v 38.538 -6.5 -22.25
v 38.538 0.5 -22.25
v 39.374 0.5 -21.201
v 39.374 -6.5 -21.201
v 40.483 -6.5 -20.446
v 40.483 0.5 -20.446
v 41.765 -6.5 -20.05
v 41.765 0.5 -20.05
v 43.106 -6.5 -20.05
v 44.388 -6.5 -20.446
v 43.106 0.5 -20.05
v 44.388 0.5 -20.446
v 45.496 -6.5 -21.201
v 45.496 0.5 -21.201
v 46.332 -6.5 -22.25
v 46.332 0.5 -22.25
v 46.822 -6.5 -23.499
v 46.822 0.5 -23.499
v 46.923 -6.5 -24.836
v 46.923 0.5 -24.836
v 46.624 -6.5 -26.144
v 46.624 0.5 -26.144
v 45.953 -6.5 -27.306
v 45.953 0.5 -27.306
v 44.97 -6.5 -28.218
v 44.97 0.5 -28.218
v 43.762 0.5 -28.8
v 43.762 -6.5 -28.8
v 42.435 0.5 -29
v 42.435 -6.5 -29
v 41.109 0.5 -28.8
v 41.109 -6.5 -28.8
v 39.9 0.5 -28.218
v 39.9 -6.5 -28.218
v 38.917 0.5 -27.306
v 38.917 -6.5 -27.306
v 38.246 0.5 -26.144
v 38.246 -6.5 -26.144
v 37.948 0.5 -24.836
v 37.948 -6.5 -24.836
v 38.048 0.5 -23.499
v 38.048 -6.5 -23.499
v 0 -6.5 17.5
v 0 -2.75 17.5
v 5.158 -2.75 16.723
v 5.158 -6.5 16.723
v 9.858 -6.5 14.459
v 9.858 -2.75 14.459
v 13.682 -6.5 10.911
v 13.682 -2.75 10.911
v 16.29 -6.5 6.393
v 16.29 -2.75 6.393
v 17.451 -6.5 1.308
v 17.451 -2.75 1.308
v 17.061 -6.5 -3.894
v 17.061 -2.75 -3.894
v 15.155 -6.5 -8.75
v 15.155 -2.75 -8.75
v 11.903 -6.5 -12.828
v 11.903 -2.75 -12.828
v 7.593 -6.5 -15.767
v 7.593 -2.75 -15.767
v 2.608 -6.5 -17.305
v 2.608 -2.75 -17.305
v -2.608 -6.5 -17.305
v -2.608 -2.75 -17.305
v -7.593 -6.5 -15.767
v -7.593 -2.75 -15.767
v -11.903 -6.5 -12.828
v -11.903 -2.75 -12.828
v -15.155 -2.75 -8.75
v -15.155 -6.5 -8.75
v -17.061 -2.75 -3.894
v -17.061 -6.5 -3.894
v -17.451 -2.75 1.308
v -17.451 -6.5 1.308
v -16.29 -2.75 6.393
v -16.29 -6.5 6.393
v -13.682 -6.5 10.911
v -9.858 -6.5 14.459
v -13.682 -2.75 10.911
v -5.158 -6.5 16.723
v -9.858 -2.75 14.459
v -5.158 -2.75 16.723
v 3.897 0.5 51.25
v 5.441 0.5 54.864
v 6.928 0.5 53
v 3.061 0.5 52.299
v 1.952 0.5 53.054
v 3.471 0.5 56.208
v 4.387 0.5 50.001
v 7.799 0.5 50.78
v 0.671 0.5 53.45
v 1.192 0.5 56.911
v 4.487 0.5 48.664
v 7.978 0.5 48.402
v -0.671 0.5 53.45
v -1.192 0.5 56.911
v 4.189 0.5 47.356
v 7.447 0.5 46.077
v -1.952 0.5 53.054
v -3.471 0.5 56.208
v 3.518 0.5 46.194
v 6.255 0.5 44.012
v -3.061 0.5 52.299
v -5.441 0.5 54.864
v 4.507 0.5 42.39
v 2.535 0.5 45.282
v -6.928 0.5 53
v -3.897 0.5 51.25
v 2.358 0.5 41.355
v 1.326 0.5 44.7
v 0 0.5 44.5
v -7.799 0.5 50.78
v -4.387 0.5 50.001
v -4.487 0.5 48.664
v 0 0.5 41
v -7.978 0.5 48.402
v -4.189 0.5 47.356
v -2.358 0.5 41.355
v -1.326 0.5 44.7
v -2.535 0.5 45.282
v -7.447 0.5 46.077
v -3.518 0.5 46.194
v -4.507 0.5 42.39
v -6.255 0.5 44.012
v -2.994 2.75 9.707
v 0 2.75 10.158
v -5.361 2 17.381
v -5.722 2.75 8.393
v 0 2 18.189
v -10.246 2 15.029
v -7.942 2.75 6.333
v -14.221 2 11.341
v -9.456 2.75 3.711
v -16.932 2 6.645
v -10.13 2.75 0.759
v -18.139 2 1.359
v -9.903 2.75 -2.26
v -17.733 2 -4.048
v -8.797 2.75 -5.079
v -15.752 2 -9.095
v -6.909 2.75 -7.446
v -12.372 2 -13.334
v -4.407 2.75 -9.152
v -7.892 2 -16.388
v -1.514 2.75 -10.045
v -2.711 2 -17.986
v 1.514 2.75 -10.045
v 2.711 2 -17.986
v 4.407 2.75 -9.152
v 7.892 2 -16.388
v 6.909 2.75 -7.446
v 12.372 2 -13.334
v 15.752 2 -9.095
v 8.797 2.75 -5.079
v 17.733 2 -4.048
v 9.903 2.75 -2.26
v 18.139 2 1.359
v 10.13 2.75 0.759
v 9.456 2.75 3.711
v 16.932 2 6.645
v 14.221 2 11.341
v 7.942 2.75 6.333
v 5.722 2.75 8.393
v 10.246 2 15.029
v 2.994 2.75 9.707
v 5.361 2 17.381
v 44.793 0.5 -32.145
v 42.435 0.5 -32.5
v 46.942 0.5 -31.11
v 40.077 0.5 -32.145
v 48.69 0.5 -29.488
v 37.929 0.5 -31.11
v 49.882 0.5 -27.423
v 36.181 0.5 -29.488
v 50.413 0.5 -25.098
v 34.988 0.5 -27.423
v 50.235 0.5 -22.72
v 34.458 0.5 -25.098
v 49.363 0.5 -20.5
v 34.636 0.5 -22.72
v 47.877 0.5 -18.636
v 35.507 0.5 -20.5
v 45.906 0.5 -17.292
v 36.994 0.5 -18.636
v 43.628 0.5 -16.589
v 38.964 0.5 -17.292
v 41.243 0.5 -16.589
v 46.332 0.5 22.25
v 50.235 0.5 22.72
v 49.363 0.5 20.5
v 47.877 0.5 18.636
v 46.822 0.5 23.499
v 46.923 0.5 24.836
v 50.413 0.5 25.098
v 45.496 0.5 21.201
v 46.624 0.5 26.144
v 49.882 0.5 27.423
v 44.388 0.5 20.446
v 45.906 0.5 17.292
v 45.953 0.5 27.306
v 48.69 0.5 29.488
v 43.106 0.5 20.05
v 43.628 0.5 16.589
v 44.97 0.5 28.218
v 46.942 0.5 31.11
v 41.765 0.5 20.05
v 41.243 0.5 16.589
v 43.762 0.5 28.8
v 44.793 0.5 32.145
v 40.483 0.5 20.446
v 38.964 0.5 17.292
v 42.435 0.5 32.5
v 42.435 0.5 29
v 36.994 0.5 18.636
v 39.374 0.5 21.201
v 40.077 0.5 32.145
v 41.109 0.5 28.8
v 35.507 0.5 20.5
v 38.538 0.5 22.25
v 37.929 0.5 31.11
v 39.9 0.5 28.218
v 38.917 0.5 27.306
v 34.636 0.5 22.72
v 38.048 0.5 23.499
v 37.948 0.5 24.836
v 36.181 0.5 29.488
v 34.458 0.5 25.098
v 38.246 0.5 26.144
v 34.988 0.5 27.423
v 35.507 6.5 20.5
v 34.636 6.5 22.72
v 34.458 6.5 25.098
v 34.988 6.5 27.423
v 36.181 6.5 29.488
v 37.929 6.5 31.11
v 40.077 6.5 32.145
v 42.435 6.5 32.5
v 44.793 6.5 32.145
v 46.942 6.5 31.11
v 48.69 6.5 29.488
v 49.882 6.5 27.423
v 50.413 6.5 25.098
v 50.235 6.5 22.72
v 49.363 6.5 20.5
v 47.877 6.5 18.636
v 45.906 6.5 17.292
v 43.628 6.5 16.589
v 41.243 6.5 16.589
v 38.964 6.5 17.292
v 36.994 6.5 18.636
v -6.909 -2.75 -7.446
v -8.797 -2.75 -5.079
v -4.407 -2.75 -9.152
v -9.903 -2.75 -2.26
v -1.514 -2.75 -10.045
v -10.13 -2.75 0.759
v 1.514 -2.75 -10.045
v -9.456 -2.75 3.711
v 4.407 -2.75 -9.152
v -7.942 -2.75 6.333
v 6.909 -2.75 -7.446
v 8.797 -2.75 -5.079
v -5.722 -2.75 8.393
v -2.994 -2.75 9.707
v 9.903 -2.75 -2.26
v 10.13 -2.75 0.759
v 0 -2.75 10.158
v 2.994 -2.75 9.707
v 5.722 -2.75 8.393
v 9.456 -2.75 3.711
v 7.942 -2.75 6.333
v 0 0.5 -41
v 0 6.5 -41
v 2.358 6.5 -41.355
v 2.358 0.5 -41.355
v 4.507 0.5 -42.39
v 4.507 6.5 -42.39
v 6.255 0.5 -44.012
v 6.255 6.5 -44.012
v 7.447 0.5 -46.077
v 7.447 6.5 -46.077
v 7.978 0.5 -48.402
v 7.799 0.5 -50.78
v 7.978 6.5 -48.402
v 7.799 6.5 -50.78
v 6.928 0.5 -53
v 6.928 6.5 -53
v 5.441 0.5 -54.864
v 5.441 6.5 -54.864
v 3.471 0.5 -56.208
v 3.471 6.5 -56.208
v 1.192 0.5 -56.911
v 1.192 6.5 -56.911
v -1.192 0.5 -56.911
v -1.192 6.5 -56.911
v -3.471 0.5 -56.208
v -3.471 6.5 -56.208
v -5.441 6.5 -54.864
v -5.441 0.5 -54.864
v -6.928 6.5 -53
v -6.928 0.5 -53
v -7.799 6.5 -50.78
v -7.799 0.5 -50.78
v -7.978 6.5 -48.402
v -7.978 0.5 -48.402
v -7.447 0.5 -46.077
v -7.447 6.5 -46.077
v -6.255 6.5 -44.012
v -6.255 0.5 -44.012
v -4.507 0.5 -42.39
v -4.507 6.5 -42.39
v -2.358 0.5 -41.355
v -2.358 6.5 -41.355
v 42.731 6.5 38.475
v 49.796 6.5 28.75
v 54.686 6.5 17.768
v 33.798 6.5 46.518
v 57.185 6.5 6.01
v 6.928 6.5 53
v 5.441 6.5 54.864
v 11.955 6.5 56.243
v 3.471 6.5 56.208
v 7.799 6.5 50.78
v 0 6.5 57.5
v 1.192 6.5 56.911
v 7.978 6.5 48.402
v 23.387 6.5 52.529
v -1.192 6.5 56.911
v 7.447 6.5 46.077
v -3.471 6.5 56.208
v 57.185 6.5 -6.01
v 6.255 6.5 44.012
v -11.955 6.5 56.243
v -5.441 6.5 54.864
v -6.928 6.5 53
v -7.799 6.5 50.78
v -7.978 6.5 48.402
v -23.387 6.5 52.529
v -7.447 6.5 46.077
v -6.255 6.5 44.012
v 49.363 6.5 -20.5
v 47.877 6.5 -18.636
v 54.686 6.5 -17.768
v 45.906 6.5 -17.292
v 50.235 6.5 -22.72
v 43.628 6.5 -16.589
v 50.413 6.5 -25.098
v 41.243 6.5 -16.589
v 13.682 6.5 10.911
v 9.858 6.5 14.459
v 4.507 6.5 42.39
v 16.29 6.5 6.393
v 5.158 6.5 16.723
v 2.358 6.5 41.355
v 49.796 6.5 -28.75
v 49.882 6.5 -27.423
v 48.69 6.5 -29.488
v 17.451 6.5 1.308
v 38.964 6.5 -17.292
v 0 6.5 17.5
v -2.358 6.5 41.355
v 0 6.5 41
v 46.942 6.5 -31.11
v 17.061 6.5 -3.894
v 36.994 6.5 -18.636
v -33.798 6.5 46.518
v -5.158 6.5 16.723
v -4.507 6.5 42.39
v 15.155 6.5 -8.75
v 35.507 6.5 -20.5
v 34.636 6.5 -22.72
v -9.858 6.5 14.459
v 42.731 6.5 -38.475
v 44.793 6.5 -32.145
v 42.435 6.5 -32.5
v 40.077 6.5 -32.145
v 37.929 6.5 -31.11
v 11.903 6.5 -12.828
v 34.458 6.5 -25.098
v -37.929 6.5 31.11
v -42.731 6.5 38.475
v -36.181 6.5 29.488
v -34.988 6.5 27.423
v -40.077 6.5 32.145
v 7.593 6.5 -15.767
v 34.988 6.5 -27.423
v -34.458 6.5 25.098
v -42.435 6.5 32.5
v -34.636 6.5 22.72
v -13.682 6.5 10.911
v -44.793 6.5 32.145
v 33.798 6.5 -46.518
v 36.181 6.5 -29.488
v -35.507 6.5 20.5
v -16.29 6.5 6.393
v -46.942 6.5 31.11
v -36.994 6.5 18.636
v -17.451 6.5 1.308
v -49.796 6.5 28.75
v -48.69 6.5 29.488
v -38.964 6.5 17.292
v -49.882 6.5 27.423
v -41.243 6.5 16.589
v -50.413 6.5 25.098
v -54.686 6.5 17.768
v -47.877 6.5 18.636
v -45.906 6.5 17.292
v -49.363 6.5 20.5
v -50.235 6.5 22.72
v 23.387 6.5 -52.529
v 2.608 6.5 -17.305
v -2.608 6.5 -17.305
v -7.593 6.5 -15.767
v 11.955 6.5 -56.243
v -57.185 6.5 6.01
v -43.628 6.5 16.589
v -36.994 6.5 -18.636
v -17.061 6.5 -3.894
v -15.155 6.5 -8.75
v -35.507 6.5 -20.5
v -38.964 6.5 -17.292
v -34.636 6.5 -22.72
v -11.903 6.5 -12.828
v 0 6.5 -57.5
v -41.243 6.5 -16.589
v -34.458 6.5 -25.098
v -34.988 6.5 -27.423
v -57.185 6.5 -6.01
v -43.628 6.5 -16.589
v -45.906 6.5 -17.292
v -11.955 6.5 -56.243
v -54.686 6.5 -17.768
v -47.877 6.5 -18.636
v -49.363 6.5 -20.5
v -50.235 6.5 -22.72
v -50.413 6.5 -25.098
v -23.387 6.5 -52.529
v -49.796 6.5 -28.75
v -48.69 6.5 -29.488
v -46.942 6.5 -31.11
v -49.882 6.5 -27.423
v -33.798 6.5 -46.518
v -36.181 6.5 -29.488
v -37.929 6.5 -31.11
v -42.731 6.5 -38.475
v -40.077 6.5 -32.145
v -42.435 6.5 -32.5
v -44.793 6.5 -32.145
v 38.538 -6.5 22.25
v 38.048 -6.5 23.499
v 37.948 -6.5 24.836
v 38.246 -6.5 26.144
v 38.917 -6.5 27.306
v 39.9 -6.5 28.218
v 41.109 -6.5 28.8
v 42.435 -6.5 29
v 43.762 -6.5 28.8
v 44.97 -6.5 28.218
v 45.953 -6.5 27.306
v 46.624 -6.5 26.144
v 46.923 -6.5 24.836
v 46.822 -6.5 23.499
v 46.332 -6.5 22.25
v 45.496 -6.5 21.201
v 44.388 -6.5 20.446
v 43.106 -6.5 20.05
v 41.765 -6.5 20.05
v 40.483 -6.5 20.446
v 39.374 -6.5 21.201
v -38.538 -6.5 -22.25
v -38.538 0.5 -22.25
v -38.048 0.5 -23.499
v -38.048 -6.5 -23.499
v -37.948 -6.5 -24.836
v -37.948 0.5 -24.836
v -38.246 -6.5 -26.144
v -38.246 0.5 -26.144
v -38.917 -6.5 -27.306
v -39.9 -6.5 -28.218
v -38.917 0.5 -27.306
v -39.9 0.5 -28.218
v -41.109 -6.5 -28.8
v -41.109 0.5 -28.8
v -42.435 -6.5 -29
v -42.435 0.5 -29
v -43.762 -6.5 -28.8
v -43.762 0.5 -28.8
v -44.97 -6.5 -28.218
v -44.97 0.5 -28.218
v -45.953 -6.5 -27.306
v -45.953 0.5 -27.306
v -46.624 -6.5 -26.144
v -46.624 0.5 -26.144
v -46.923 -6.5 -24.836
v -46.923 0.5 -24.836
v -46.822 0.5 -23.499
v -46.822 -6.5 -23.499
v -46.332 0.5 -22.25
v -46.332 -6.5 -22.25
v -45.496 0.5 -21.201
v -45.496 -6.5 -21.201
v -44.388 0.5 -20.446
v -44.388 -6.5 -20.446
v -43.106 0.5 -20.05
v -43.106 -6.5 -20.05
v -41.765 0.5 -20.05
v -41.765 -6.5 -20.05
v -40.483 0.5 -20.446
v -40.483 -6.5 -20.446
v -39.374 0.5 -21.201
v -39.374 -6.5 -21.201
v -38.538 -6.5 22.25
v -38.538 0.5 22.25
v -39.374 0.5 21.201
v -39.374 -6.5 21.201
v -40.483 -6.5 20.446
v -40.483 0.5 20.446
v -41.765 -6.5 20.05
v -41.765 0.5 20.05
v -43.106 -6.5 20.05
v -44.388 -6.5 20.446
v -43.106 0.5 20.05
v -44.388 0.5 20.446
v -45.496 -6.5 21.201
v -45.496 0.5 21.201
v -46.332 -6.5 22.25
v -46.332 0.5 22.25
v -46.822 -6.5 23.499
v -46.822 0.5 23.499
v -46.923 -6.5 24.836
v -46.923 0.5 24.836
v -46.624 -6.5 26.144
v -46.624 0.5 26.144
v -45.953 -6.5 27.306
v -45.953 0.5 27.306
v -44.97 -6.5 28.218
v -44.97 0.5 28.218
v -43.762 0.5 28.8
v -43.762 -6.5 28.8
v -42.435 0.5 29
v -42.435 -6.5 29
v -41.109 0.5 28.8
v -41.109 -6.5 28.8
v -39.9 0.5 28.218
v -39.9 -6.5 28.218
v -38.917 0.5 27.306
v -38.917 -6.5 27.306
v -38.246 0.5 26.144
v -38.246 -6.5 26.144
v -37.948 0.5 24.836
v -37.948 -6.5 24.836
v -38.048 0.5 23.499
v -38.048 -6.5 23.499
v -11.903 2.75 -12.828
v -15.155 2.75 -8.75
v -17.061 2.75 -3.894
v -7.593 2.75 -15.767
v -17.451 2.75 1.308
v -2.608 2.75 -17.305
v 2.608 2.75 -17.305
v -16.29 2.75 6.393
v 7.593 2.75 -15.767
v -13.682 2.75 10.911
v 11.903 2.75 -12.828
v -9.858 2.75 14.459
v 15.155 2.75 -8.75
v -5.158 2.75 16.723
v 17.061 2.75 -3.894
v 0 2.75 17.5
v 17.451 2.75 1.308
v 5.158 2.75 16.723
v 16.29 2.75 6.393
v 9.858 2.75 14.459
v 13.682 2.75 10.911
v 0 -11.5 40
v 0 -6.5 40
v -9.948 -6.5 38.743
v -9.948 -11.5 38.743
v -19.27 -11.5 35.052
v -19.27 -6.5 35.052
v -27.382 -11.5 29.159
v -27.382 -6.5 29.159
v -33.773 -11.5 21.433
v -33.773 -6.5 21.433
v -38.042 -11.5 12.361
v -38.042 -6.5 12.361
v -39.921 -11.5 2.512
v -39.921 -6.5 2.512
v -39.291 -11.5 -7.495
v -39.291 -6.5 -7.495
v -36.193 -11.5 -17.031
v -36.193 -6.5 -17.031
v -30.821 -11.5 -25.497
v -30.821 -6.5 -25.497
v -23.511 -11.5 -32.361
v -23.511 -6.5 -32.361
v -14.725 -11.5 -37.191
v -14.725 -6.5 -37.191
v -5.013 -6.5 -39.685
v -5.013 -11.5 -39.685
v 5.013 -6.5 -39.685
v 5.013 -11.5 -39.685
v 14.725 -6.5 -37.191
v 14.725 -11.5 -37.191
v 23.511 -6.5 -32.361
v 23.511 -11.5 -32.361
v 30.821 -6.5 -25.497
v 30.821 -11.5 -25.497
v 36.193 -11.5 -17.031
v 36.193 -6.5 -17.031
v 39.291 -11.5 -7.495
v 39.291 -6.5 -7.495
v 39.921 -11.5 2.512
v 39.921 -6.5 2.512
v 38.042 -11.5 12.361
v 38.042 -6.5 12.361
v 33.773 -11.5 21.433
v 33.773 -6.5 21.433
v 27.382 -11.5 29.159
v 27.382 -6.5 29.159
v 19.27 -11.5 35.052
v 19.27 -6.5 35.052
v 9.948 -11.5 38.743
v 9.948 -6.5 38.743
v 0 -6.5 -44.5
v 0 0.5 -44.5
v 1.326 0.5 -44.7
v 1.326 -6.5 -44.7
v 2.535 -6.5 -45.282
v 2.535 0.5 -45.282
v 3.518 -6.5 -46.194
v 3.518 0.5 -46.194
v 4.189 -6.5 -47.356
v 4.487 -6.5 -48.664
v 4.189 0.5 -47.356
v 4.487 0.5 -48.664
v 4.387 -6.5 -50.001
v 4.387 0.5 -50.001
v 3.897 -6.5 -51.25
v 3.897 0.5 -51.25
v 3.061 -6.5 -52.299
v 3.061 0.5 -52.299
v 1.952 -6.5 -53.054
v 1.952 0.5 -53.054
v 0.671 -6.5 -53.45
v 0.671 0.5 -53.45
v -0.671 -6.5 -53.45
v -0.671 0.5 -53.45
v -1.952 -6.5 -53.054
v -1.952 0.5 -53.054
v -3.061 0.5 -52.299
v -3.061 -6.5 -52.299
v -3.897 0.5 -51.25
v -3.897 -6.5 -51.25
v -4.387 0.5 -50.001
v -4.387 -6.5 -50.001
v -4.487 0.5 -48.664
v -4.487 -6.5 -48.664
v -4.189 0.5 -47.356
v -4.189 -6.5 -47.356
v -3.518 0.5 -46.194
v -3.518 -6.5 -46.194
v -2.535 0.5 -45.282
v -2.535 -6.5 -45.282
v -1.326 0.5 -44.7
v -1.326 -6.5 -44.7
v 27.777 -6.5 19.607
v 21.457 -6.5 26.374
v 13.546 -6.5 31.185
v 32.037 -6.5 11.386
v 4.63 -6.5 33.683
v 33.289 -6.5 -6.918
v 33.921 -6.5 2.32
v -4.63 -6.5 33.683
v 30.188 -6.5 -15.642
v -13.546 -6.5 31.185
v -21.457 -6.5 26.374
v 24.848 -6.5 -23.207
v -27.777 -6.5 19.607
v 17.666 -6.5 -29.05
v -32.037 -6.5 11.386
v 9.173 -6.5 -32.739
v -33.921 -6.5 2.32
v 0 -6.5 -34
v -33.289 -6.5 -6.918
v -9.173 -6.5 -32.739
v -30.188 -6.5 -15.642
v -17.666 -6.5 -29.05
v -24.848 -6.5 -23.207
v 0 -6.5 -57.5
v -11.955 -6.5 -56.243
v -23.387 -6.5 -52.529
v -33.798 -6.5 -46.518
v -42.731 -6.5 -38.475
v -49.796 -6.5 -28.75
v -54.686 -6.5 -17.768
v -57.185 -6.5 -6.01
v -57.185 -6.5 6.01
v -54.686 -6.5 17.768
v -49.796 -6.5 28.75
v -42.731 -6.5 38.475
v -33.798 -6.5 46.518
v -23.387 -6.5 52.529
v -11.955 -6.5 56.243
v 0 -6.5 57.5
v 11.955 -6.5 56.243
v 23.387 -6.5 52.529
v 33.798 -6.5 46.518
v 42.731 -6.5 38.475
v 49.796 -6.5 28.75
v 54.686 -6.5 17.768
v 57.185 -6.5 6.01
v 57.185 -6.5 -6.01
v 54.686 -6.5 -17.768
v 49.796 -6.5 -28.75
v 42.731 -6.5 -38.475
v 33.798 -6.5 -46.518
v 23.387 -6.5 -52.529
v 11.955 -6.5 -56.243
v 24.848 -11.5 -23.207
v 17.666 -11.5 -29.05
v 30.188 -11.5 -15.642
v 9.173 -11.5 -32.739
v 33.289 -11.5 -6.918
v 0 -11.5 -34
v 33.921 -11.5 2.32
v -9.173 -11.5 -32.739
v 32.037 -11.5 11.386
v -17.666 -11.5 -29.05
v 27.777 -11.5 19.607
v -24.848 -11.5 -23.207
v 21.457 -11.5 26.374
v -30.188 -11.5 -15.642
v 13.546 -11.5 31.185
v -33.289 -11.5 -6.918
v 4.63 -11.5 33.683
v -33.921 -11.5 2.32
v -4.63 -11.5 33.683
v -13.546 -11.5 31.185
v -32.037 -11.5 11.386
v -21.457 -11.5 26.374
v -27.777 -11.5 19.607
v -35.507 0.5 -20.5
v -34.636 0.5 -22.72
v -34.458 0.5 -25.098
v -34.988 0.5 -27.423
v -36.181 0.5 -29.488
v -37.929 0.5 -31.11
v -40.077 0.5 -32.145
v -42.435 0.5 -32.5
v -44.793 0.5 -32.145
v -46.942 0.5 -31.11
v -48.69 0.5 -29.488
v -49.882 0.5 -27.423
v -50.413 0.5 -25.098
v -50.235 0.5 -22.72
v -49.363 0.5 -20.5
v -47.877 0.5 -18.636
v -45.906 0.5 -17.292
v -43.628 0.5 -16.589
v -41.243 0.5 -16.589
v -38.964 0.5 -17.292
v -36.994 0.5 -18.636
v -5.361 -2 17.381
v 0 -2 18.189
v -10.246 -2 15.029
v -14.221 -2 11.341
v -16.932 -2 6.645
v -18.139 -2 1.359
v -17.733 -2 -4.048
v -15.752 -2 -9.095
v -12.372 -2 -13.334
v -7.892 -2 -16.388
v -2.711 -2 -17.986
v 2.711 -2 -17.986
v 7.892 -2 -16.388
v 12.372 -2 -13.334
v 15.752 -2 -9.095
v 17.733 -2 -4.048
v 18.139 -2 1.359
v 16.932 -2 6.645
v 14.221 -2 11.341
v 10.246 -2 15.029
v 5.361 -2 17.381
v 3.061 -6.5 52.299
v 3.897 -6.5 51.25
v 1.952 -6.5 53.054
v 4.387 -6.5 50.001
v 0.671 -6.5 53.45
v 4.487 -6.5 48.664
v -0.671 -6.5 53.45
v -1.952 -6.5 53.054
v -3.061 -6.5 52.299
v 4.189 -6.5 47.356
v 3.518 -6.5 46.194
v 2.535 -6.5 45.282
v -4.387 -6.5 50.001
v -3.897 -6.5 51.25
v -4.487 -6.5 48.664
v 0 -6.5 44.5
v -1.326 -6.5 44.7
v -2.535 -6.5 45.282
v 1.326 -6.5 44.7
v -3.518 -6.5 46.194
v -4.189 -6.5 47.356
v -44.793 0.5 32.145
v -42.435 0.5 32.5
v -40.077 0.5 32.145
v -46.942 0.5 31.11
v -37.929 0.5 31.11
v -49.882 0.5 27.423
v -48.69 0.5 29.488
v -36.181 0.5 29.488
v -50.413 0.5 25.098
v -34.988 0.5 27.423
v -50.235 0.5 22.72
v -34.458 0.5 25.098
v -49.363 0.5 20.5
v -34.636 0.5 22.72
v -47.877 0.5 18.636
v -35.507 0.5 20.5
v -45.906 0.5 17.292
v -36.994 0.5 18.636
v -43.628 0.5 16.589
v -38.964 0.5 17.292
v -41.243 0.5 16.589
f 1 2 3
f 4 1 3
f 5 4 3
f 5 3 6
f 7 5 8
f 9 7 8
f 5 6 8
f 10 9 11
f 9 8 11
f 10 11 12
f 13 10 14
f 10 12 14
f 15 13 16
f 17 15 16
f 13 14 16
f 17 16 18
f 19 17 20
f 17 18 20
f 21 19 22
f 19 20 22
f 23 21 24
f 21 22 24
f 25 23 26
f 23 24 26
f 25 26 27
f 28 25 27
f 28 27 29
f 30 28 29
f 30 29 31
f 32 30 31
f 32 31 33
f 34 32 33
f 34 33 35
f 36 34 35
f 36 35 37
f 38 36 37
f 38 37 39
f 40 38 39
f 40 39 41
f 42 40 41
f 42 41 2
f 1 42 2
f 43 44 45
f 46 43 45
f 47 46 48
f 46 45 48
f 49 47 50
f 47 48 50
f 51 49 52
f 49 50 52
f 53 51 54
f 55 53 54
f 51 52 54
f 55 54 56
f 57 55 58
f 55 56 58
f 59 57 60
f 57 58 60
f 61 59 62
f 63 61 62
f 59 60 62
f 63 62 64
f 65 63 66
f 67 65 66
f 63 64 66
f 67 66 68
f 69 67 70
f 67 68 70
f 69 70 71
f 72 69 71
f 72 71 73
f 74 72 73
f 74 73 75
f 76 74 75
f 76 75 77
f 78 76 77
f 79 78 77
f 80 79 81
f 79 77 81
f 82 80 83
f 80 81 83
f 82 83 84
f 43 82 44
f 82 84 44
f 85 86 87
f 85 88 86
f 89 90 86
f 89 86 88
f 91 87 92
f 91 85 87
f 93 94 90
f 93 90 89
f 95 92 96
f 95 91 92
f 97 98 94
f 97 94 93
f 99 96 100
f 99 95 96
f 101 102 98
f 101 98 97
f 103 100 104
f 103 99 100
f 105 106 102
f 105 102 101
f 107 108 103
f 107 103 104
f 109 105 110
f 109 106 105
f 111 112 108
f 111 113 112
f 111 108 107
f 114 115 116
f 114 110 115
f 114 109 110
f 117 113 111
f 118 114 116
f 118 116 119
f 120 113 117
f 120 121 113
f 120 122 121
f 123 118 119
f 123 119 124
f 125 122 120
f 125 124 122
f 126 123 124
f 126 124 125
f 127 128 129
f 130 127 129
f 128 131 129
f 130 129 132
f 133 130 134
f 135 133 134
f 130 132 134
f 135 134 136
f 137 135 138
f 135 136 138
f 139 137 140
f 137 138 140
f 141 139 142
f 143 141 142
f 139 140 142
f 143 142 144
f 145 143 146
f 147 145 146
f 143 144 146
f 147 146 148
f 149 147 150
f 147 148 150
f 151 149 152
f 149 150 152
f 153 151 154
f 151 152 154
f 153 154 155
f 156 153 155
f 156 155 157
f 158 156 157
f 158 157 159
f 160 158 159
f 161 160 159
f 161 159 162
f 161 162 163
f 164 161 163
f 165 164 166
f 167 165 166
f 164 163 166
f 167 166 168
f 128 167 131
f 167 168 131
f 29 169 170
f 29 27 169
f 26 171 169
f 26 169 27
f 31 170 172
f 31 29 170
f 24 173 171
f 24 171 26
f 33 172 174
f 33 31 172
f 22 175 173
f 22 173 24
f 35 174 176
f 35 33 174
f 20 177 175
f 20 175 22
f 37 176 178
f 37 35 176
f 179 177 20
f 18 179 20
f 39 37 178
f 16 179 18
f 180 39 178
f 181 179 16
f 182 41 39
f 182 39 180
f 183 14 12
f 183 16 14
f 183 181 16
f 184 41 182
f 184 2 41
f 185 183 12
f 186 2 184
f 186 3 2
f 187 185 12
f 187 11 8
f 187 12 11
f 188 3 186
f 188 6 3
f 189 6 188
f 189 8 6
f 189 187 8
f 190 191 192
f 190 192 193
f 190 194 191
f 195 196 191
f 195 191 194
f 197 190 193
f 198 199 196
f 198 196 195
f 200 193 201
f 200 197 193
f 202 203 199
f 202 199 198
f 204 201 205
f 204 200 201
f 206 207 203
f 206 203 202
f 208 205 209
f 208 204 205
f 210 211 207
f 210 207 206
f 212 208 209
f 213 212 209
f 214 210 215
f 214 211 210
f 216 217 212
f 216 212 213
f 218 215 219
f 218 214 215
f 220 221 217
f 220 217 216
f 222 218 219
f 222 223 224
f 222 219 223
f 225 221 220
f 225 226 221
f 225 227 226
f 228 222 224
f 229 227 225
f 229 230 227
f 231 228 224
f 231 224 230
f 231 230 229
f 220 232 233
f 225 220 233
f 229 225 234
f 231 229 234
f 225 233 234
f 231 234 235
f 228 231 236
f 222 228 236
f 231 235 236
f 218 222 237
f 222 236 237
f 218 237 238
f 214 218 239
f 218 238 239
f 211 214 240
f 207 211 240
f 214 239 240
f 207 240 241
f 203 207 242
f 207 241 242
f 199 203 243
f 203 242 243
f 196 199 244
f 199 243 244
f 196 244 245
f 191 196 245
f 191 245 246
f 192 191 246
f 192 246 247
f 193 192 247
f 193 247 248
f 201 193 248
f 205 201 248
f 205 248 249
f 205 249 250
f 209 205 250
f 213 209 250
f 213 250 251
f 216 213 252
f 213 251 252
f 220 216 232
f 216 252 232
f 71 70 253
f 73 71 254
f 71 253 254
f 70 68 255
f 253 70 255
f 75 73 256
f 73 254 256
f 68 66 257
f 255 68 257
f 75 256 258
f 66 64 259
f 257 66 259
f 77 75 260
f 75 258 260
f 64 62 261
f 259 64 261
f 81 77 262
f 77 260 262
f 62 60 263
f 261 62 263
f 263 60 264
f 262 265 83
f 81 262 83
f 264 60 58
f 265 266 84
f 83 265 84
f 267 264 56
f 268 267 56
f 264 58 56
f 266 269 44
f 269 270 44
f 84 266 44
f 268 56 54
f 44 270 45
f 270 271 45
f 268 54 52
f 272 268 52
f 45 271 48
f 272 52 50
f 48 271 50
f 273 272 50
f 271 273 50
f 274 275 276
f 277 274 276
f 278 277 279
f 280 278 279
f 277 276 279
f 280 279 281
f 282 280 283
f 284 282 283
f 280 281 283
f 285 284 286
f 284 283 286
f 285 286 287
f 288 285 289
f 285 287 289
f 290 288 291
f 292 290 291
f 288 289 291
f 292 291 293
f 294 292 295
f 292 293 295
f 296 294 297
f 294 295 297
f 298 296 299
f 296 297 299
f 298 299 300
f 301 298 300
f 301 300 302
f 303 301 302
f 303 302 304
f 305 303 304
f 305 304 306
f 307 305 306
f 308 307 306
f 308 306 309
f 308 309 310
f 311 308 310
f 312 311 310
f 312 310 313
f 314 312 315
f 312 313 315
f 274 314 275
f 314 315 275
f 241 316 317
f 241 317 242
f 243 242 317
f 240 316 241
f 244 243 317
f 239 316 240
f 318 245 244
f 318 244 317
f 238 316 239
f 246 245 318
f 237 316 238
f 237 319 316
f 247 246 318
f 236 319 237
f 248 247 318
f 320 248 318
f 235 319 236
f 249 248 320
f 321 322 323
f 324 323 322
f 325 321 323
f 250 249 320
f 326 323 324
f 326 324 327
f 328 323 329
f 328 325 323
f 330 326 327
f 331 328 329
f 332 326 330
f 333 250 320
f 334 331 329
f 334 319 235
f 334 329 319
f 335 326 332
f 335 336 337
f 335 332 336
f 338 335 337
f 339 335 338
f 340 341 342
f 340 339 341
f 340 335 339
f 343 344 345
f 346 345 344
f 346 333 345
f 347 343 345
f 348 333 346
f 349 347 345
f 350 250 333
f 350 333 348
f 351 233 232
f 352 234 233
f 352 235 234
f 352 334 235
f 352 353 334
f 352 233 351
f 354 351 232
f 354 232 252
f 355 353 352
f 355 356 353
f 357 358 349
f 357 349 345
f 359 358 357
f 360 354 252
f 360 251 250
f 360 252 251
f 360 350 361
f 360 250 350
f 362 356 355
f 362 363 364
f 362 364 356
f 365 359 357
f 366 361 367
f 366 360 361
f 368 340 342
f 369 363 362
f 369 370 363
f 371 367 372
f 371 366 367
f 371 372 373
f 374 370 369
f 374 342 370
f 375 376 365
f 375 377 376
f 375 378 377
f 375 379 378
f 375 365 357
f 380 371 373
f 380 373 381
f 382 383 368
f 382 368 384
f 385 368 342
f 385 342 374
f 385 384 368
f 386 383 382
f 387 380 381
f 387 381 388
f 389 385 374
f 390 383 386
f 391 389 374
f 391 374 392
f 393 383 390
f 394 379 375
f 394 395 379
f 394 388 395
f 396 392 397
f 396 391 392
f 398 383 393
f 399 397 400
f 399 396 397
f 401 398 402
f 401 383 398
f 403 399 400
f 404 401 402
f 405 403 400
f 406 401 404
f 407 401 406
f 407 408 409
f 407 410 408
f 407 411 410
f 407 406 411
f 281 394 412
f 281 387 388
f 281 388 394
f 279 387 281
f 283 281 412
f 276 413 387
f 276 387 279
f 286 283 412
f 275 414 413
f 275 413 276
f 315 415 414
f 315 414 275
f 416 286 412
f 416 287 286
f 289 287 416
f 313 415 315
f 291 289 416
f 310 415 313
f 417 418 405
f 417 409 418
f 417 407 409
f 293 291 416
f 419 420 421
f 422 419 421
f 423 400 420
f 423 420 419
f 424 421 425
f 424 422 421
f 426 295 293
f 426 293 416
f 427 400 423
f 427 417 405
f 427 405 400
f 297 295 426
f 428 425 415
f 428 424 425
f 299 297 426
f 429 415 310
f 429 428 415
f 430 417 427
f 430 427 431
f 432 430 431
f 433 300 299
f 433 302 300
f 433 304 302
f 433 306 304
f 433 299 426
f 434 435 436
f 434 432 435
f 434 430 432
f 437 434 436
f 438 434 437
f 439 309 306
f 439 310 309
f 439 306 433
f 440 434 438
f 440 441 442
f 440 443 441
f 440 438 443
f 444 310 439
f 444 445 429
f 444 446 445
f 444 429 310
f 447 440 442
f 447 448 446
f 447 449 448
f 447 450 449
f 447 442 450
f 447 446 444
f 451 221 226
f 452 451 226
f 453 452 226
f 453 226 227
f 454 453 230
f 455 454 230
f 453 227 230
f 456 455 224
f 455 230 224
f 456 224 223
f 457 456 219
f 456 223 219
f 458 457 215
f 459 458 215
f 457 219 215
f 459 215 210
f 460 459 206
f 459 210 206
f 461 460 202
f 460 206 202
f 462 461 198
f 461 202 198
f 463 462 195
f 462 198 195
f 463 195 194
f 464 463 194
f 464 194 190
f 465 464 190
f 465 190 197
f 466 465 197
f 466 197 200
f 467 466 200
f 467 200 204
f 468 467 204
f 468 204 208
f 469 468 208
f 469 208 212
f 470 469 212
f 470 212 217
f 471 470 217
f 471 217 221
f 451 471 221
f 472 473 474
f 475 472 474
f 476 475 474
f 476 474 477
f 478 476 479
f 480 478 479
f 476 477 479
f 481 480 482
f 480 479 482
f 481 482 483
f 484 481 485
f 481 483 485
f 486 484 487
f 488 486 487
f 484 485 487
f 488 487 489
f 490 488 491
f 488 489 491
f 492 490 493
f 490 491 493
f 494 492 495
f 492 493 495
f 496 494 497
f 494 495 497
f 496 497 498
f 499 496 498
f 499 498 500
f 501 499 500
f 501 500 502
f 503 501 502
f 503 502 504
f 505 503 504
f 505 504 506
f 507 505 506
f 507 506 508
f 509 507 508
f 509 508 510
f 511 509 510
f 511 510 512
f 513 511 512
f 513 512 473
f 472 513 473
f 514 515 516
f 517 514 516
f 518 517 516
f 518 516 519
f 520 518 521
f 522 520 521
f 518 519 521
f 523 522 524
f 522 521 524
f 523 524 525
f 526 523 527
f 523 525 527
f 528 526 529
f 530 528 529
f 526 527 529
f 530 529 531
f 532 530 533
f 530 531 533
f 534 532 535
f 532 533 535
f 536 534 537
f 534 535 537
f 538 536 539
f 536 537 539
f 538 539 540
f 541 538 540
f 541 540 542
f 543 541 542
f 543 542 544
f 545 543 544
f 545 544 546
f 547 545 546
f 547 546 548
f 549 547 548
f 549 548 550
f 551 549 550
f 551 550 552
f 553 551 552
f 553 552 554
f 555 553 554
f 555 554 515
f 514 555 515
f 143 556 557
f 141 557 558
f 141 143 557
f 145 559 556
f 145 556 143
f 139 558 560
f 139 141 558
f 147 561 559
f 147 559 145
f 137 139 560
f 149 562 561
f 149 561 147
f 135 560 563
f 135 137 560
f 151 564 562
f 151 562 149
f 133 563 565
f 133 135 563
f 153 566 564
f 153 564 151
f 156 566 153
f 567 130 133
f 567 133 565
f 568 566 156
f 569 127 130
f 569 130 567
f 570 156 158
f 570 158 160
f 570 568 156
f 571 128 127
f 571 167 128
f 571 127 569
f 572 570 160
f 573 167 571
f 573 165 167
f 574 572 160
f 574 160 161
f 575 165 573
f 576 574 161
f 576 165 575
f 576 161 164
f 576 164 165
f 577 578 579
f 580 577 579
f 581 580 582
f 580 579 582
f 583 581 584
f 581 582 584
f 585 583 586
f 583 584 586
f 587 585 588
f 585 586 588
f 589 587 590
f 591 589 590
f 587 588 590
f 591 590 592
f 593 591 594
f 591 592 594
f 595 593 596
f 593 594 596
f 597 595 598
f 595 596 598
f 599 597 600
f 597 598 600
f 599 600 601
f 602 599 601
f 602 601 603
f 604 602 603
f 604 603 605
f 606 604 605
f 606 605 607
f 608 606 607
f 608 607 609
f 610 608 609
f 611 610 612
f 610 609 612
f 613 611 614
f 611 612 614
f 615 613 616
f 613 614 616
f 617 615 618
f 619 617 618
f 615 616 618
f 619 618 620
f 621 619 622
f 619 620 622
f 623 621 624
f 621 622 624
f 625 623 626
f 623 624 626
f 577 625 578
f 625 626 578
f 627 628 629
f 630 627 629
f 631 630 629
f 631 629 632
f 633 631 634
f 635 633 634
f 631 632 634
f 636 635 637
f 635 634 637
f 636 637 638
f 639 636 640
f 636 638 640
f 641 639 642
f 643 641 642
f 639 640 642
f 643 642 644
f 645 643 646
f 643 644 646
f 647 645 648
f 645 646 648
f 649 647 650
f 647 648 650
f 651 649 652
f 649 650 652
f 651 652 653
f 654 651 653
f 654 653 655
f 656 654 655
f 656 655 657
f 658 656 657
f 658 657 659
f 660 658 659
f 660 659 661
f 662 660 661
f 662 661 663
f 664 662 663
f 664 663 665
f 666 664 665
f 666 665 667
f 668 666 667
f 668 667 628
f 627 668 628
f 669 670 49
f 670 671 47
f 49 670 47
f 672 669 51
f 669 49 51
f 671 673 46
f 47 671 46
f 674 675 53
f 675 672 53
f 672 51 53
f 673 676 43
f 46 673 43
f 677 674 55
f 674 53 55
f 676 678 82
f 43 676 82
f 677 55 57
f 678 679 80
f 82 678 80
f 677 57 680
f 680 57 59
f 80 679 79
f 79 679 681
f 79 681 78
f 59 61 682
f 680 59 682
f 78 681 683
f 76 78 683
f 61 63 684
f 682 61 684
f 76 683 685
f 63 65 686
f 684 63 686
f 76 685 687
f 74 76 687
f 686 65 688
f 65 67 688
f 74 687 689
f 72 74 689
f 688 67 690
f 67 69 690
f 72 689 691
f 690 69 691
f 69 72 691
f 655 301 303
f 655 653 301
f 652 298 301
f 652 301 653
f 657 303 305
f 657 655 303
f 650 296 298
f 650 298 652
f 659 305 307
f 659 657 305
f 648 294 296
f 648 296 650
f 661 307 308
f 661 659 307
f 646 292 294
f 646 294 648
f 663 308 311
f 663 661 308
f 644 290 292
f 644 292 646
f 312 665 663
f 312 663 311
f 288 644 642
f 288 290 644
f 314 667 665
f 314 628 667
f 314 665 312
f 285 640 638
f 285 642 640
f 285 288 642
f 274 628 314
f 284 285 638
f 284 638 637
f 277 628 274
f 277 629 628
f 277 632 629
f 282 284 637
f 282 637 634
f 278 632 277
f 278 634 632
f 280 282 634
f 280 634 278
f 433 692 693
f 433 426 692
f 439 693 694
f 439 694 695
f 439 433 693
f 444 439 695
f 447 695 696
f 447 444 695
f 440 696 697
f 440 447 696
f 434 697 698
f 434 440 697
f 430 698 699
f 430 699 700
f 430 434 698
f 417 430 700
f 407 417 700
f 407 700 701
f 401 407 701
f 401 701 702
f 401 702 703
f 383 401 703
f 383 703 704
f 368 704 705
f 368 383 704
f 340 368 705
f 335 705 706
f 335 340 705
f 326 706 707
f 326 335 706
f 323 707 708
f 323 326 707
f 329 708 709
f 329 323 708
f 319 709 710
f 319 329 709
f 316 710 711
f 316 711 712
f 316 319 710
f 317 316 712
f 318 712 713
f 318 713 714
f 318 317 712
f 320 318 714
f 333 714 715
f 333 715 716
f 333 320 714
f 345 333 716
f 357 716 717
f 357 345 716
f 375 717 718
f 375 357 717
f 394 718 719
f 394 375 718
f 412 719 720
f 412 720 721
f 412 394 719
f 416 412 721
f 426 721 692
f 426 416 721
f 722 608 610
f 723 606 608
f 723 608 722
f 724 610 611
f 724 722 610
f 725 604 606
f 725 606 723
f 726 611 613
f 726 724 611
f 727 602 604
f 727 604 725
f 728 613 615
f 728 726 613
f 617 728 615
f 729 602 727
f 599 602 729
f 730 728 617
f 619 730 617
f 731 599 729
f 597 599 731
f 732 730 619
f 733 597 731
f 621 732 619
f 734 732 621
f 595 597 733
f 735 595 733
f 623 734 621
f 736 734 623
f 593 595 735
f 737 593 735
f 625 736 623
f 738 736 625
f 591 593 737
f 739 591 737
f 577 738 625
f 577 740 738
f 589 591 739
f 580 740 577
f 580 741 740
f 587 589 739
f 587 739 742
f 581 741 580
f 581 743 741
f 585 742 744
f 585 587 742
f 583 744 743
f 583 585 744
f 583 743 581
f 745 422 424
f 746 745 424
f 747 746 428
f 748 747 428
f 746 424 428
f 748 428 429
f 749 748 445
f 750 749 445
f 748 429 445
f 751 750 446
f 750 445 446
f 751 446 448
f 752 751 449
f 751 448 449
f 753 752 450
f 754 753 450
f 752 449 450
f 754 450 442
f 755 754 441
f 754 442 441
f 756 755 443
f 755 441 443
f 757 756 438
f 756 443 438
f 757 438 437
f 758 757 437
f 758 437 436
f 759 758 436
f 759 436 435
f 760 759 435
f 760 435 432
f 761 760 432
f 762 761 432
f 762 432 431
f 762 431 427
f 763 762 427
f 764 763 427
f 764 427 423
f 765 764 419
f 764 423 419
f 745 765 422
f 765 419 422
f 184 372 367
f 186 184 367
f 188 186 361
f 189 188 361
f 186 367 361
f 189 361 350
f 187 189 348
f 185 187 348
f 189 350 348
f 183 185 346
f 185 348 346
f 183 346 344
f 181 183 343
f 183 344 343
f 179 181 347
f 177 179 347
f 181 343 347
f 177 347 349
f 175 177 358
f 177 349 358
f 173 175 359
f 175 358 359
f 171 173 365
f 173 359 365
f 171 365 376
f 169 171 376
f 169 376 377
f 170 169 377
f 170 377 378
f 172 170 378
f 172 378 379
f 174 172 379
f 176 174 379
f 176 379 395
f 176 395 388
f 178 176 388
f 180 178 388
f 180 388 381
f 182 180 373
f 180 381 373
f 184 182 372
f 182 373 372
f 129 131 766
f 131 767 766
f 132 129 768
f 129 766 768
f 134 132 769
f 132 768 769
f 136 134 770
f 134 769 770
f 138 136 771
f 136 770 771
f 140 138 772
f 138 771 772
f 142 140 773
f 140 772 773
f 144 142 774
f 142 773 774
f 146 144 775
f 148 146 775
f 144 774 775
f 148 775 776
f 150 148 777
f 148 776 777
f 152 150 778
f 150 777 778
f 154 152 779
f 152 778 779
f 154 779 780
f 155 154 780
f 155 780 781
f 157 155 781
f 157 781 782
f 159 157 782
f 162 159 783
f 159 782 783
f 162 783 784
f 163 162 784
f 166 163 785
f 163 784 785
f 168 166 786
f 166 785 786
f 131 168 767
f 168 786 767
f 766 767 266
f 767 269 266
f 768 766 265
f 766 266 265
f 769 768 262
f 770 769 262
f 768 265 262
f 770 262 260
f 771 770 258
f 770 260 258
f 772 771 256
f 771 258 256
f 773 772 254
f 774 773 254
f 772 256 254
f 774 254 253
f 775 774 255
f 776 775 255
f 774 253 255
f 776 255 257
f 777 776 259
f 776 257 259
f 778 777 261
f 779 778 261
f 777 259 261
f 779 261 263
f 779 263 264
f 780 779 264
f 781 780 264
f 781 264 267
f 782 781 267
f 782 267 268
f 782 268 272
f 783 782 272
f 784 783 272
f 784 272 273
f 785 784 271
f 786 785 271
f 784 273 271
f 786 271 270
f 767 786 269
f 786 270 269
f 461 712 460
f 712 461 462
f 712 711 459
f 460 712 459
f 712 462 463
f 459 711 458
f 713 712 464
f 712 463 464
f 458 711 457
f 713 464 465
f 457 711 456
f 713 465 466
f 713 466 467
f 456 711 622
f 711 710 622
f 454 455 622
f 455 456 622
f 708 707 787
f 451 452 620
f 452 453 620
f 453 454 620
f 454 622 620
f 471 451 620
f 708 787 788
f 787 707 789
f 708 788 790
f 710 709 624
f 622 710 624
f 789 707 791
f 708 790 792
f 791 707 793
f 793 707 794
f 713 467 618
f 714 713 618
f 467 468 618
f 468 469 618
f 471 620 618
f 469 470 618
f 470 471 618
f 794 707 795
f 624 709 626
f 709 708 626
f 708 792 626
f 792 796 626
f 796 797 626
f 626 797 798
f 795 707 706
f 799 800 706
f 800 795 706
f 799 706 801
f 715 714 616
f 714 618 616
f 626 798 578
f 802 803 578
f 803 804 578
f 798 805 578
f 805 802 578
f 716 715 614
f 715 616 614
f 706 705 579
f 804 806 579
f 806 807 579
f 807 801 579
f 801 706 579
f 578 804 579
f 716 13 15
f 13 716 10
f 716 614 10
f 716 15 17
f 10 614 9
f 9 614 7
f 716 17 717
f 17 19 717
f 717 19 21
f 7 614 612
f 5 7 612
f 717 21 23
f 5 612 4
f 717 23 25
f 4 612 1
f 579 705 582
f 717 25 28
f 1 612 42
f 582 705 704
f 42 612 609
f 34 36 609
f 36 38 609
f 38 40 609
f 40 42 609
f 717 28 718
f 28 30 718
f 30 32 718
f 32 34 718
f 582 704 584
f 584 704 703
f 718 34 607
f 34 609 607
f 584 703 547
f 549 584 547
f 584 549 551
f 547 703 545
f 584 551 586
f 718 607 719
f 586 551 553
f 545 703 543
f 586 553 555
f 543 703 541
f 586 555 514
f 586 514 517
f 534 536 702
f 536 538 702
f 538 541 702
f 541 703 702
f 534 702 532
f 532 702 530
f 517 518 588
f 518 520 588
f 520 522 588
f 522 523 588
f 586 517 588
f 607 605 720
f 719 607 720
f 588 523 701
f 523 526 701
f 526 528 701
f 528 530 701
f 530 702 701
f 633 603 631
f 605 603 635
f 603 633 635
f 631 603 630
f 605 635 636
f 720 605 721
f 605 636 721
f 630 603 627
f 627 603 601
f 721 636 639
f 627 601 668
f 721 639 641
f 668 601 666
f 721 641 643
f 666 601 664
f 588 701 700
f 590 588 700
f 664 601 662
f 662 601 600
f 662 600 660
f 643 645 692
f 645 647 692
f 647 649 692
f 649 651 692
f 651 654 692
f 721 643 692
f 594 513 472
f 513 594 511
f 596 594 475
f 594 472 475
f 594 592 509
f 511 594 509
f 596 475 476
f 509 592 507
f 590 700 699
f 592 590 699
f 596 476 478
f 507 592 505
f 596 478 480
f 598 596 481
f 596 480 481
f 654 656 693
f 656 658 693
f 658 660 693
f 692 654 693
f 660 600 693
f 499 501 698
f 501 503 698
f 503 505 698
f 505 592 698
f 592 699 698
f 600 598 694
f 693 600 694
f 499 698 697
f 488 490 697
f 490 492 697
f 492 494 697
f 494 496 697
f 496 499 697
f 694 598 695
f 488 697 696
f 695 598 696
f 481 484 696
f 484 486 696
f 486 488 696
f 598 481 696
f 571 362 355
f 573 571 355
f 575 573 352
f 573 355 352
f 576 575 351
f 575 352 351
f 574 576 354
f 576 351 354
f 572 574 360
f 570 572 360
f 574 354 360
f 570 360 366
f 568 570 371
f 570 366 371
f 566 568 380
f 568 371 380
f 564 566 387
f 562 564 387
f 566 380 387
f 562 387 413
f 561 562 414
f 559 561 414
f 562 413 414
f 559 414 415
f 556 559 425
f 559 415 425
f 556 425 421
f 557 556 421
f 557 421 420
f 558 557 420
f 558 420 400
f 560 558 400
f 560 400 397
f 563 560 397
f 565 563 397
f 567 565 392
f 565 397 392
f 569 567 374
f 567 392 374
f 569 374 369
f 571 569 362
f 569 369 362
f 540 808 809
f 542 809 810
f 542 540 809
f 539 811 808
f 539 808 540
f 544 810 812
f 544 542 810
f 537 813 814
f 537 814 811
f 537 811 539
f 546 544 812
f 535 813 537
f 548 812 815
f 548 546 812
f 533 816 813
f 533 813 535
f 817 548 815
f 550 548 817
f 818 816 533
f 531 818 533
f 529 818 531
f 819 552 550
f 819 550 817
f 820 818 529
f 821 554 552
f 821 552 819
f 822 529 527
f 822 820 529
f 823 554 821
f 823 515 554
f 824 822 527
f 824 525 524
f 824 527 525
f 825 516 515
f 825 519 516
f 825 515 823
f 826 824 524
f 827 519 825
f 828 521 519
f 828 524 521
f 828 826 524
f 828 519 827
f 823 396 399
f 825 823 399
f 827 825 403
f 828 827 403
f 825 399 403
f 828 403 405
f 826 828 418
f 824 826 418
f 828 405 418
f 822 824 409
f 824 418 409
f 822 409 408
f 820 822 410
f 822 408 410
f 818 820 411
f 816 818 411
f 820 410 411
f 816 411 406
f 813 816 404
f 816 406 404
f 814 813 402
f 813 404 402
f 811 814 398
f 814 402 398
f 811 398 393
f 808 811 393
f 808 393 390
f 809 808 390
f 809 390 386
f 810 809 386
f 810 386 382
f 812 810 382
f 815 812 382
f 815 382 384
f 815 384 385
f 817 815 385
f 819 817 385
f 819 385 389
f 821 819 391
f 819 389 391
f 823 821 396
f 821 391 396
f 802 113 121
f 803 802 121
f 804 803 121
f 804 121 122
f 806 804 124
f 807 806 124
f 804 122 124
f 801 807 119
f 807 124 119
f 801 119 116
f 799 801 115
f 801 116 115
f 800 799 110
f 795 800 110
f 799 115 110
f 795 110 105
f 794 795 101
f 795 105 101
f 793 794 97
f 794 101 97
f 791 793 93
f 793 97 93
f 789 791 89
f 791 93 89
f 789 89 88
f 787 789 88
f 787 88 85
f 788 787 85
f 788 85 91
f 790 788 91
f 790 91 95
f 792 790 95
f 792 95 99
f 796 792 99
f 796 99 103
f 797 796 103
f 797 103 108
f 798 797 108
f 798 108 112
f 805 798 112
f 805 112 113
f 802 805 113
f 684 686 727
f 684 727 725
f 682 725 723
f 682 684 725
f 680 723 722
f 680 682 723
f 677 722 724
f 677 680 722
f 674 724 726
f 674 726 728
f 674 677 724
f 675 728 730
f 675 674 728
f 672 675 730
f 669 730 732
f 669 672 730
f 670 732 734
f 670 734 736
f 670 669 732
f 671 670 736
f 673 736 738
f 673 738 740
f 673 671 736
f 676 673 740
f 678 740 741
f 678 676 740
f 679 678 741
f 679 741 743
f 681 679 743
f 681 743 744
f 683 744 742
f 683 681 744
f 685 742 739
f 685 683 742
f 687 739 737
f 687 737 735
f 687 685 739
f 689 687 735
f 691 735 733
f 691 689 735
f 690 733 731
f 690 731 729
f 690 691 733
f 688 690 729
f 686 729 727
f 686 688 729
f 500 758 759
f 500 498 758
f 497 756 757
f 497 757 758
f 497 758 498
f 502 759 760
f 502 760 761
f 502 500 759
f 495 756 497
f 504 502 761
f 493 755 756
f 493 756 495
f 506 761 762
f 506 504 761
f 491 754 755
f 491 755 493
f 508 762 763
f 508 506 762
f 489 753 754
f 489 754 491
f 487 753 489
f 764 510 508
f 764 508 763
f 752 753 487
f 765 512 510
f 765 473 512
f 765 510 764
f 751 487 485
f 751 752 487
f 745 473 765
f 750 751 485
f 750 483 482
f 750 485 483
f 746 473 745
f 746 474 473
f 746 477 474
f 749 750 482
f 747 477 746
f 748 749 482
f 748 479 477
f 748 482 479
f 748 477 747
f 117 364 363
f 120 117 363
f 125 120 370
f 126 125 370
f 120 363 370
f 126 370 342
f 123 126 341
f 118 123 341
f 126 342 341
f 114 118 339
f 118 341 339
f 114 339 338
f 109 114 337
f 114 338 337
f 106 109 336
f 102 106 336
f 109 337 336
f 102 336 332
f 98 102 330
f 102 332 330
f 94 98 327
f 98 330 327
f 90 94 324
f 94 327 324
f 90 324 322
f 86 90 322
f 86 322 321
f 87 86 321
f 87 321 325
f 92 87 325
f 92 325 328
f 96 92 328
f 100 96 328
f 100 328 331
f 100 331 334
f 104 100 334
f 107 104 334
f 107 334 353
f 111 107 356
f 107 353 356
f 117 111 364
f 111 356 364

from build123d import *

# Parameters (mm, degrees)
SKETCH_1_R               = 57.5
EXTRUDE_1_DEPTH          = 6.5
SKETCH_3_R               = 8
CUT_EXTRUDE_1_DEPTH      = 6
SKETCH_4_R               = 4.5
CUT_EXTRUDE_2_DEPTH      = 82.618012718
PATTERN_CIRCULAR_1_COUNT = 6
SKETCH_6_R               = 17.5
CUT_EXTRUDE_3_DEPTH      = 3.75
SKETCH_9_R               = 17.5
CUT_EXTRUDE_4_DEPTH      = 3.75
SKETCH_10_R              = 40
SKETCH_10_R_2            = 34
EXTRUDE_2_DEPTH          = 5


with BuildPart() as part:
    # 草图1 → 凸台-拉伸1 (new, symmetric)
    with BuildSketch(Plane(origin=(0, 0, 0), x_dir=(1, 0, 0), z_dir=(0, 1, 0))):
        with Locations(Location((0, 0, 0), (0, 0, 90))):
            Circle(SKETCH_1_R)
    extrude(amount=EXTRUDE_1_DEPTH, both=True)

    # 草图3 → 切除-拉伸1 (cut)
    with BuildSketch(Plane(origin=(0, 6.5, 0), x_dir=(1, 0, 0), z_dir=(0, 1, 0))):
        with Locations(Location((0, 49, 0), (0, 0, 270))):
            Circle(SKETCH_3_R)
    cut_extrude_1 = extrude(amount=-CUT_EXTRUDE_1_DEPTH, mode=Mode.SUBTRACT)

    # 草图4 → 切除-拉伸2 (cut, through all)
    with BuildSketch(Plane(origin=(0, 0.5, 0), x_dir=(1, 0, 0), z_dir=(0, 1, 0))):
        with Locations(Location((0, 49, 0), (0, 0, 270))):
            Circle(SKETCH_4_R)
    cut_extrude_2 = extrude(amount=-CUT_EXTRUDE_2_DEPTH, mode=Mode.SUBTRACT)

    # 阵列(圆周)1: 切除-拉伸1, 切除-拉伸2 ×6 about axis
    pattern_circular_1_axis = Axis((0, 0, 0), (0, 1, 0))
    add([cut_extrude_1.rotate(pattern_circular_1_axis, i * 360 / PATTERN_CIRCULAR_1_COUNT) for i in range(1, PATTERN_CIRCULAR_1_COUNT)], mode=Mode.SUBTRACT)
    add([cut_extrude_2.rotate(pattern_circular_1_axis, i * 360 / PATTERN_CIRCULAR_1_COUNT) for i in range(1, PATTERN_CIRCULAR_1_COUNT)], mode=Mode.SUBTRACT)

    # 草图6 → 切除-拉伸3 (cut)
    with BuildSketch(Plane(origin=(0, 6.5, 0), x_dir=(1, 0, 0), z_dir=(0, 1, 0))):
        with Locations(Location((0, 0, 0), (0, 0, 270))):
            Circle(SKETCH_6_R)
    extrude(amount=-CUT_EXTRUDE_3_DEPTH, mode=Mode.SUBTRACT)

    # 草图8 → 切除-旋转1 (revolve, cut)
    with BuildSketch(Plane.XY, mode=Mode.PRIVATE) as cut_revolve_1_sk:
        Polygon((-10.158018271, 2.75), (-18.189384238, 2), (-18.189384238, -2), (-10.158018271, -2.75), (0, -2.75), (0, 2.75), align=None)
    revolve(cut_revolve_1_sk.sketch.rotate(Axis((0, 37.664252475, 0), (0, -1, 0)), 270), axis=Axis((0, 37.664252475, 0), (0, -1, 0)), mode=Mode.SUBTRACT)

    # 草图9 → 切除-拉伸4 (cut)
    with BuildSketch(Plane(origin=(0, -2.75, 0), x_dir=(1, 0, 0), z_dir=(0, 1, 0))):
        with Locations(Location((0, 0, 0), (0, 0, 270))):
            Circle(SKETCH_9_R)
    extrude(amount=-CUT_EXTRUDE_4_DEPTH, mode=Mode.SUBTRACT)

    # 草图10 → 凸台-拉伸2 (add)
    with BuildSketch(Plane.XZ.offset(6.5)):
        with Locations(Location((0, 0, 0), (0, 0, 90))):
            Circle(SKETCH_10_R)
        with Locations(Location((0, 0, 0), (0, 0, 270))):
            Circle(SKETCH_10_R_2, mode=Mode.SUBTRACT)
    extrude(amount=EXTRUDE_2_DEPTH)


solid = part.part
